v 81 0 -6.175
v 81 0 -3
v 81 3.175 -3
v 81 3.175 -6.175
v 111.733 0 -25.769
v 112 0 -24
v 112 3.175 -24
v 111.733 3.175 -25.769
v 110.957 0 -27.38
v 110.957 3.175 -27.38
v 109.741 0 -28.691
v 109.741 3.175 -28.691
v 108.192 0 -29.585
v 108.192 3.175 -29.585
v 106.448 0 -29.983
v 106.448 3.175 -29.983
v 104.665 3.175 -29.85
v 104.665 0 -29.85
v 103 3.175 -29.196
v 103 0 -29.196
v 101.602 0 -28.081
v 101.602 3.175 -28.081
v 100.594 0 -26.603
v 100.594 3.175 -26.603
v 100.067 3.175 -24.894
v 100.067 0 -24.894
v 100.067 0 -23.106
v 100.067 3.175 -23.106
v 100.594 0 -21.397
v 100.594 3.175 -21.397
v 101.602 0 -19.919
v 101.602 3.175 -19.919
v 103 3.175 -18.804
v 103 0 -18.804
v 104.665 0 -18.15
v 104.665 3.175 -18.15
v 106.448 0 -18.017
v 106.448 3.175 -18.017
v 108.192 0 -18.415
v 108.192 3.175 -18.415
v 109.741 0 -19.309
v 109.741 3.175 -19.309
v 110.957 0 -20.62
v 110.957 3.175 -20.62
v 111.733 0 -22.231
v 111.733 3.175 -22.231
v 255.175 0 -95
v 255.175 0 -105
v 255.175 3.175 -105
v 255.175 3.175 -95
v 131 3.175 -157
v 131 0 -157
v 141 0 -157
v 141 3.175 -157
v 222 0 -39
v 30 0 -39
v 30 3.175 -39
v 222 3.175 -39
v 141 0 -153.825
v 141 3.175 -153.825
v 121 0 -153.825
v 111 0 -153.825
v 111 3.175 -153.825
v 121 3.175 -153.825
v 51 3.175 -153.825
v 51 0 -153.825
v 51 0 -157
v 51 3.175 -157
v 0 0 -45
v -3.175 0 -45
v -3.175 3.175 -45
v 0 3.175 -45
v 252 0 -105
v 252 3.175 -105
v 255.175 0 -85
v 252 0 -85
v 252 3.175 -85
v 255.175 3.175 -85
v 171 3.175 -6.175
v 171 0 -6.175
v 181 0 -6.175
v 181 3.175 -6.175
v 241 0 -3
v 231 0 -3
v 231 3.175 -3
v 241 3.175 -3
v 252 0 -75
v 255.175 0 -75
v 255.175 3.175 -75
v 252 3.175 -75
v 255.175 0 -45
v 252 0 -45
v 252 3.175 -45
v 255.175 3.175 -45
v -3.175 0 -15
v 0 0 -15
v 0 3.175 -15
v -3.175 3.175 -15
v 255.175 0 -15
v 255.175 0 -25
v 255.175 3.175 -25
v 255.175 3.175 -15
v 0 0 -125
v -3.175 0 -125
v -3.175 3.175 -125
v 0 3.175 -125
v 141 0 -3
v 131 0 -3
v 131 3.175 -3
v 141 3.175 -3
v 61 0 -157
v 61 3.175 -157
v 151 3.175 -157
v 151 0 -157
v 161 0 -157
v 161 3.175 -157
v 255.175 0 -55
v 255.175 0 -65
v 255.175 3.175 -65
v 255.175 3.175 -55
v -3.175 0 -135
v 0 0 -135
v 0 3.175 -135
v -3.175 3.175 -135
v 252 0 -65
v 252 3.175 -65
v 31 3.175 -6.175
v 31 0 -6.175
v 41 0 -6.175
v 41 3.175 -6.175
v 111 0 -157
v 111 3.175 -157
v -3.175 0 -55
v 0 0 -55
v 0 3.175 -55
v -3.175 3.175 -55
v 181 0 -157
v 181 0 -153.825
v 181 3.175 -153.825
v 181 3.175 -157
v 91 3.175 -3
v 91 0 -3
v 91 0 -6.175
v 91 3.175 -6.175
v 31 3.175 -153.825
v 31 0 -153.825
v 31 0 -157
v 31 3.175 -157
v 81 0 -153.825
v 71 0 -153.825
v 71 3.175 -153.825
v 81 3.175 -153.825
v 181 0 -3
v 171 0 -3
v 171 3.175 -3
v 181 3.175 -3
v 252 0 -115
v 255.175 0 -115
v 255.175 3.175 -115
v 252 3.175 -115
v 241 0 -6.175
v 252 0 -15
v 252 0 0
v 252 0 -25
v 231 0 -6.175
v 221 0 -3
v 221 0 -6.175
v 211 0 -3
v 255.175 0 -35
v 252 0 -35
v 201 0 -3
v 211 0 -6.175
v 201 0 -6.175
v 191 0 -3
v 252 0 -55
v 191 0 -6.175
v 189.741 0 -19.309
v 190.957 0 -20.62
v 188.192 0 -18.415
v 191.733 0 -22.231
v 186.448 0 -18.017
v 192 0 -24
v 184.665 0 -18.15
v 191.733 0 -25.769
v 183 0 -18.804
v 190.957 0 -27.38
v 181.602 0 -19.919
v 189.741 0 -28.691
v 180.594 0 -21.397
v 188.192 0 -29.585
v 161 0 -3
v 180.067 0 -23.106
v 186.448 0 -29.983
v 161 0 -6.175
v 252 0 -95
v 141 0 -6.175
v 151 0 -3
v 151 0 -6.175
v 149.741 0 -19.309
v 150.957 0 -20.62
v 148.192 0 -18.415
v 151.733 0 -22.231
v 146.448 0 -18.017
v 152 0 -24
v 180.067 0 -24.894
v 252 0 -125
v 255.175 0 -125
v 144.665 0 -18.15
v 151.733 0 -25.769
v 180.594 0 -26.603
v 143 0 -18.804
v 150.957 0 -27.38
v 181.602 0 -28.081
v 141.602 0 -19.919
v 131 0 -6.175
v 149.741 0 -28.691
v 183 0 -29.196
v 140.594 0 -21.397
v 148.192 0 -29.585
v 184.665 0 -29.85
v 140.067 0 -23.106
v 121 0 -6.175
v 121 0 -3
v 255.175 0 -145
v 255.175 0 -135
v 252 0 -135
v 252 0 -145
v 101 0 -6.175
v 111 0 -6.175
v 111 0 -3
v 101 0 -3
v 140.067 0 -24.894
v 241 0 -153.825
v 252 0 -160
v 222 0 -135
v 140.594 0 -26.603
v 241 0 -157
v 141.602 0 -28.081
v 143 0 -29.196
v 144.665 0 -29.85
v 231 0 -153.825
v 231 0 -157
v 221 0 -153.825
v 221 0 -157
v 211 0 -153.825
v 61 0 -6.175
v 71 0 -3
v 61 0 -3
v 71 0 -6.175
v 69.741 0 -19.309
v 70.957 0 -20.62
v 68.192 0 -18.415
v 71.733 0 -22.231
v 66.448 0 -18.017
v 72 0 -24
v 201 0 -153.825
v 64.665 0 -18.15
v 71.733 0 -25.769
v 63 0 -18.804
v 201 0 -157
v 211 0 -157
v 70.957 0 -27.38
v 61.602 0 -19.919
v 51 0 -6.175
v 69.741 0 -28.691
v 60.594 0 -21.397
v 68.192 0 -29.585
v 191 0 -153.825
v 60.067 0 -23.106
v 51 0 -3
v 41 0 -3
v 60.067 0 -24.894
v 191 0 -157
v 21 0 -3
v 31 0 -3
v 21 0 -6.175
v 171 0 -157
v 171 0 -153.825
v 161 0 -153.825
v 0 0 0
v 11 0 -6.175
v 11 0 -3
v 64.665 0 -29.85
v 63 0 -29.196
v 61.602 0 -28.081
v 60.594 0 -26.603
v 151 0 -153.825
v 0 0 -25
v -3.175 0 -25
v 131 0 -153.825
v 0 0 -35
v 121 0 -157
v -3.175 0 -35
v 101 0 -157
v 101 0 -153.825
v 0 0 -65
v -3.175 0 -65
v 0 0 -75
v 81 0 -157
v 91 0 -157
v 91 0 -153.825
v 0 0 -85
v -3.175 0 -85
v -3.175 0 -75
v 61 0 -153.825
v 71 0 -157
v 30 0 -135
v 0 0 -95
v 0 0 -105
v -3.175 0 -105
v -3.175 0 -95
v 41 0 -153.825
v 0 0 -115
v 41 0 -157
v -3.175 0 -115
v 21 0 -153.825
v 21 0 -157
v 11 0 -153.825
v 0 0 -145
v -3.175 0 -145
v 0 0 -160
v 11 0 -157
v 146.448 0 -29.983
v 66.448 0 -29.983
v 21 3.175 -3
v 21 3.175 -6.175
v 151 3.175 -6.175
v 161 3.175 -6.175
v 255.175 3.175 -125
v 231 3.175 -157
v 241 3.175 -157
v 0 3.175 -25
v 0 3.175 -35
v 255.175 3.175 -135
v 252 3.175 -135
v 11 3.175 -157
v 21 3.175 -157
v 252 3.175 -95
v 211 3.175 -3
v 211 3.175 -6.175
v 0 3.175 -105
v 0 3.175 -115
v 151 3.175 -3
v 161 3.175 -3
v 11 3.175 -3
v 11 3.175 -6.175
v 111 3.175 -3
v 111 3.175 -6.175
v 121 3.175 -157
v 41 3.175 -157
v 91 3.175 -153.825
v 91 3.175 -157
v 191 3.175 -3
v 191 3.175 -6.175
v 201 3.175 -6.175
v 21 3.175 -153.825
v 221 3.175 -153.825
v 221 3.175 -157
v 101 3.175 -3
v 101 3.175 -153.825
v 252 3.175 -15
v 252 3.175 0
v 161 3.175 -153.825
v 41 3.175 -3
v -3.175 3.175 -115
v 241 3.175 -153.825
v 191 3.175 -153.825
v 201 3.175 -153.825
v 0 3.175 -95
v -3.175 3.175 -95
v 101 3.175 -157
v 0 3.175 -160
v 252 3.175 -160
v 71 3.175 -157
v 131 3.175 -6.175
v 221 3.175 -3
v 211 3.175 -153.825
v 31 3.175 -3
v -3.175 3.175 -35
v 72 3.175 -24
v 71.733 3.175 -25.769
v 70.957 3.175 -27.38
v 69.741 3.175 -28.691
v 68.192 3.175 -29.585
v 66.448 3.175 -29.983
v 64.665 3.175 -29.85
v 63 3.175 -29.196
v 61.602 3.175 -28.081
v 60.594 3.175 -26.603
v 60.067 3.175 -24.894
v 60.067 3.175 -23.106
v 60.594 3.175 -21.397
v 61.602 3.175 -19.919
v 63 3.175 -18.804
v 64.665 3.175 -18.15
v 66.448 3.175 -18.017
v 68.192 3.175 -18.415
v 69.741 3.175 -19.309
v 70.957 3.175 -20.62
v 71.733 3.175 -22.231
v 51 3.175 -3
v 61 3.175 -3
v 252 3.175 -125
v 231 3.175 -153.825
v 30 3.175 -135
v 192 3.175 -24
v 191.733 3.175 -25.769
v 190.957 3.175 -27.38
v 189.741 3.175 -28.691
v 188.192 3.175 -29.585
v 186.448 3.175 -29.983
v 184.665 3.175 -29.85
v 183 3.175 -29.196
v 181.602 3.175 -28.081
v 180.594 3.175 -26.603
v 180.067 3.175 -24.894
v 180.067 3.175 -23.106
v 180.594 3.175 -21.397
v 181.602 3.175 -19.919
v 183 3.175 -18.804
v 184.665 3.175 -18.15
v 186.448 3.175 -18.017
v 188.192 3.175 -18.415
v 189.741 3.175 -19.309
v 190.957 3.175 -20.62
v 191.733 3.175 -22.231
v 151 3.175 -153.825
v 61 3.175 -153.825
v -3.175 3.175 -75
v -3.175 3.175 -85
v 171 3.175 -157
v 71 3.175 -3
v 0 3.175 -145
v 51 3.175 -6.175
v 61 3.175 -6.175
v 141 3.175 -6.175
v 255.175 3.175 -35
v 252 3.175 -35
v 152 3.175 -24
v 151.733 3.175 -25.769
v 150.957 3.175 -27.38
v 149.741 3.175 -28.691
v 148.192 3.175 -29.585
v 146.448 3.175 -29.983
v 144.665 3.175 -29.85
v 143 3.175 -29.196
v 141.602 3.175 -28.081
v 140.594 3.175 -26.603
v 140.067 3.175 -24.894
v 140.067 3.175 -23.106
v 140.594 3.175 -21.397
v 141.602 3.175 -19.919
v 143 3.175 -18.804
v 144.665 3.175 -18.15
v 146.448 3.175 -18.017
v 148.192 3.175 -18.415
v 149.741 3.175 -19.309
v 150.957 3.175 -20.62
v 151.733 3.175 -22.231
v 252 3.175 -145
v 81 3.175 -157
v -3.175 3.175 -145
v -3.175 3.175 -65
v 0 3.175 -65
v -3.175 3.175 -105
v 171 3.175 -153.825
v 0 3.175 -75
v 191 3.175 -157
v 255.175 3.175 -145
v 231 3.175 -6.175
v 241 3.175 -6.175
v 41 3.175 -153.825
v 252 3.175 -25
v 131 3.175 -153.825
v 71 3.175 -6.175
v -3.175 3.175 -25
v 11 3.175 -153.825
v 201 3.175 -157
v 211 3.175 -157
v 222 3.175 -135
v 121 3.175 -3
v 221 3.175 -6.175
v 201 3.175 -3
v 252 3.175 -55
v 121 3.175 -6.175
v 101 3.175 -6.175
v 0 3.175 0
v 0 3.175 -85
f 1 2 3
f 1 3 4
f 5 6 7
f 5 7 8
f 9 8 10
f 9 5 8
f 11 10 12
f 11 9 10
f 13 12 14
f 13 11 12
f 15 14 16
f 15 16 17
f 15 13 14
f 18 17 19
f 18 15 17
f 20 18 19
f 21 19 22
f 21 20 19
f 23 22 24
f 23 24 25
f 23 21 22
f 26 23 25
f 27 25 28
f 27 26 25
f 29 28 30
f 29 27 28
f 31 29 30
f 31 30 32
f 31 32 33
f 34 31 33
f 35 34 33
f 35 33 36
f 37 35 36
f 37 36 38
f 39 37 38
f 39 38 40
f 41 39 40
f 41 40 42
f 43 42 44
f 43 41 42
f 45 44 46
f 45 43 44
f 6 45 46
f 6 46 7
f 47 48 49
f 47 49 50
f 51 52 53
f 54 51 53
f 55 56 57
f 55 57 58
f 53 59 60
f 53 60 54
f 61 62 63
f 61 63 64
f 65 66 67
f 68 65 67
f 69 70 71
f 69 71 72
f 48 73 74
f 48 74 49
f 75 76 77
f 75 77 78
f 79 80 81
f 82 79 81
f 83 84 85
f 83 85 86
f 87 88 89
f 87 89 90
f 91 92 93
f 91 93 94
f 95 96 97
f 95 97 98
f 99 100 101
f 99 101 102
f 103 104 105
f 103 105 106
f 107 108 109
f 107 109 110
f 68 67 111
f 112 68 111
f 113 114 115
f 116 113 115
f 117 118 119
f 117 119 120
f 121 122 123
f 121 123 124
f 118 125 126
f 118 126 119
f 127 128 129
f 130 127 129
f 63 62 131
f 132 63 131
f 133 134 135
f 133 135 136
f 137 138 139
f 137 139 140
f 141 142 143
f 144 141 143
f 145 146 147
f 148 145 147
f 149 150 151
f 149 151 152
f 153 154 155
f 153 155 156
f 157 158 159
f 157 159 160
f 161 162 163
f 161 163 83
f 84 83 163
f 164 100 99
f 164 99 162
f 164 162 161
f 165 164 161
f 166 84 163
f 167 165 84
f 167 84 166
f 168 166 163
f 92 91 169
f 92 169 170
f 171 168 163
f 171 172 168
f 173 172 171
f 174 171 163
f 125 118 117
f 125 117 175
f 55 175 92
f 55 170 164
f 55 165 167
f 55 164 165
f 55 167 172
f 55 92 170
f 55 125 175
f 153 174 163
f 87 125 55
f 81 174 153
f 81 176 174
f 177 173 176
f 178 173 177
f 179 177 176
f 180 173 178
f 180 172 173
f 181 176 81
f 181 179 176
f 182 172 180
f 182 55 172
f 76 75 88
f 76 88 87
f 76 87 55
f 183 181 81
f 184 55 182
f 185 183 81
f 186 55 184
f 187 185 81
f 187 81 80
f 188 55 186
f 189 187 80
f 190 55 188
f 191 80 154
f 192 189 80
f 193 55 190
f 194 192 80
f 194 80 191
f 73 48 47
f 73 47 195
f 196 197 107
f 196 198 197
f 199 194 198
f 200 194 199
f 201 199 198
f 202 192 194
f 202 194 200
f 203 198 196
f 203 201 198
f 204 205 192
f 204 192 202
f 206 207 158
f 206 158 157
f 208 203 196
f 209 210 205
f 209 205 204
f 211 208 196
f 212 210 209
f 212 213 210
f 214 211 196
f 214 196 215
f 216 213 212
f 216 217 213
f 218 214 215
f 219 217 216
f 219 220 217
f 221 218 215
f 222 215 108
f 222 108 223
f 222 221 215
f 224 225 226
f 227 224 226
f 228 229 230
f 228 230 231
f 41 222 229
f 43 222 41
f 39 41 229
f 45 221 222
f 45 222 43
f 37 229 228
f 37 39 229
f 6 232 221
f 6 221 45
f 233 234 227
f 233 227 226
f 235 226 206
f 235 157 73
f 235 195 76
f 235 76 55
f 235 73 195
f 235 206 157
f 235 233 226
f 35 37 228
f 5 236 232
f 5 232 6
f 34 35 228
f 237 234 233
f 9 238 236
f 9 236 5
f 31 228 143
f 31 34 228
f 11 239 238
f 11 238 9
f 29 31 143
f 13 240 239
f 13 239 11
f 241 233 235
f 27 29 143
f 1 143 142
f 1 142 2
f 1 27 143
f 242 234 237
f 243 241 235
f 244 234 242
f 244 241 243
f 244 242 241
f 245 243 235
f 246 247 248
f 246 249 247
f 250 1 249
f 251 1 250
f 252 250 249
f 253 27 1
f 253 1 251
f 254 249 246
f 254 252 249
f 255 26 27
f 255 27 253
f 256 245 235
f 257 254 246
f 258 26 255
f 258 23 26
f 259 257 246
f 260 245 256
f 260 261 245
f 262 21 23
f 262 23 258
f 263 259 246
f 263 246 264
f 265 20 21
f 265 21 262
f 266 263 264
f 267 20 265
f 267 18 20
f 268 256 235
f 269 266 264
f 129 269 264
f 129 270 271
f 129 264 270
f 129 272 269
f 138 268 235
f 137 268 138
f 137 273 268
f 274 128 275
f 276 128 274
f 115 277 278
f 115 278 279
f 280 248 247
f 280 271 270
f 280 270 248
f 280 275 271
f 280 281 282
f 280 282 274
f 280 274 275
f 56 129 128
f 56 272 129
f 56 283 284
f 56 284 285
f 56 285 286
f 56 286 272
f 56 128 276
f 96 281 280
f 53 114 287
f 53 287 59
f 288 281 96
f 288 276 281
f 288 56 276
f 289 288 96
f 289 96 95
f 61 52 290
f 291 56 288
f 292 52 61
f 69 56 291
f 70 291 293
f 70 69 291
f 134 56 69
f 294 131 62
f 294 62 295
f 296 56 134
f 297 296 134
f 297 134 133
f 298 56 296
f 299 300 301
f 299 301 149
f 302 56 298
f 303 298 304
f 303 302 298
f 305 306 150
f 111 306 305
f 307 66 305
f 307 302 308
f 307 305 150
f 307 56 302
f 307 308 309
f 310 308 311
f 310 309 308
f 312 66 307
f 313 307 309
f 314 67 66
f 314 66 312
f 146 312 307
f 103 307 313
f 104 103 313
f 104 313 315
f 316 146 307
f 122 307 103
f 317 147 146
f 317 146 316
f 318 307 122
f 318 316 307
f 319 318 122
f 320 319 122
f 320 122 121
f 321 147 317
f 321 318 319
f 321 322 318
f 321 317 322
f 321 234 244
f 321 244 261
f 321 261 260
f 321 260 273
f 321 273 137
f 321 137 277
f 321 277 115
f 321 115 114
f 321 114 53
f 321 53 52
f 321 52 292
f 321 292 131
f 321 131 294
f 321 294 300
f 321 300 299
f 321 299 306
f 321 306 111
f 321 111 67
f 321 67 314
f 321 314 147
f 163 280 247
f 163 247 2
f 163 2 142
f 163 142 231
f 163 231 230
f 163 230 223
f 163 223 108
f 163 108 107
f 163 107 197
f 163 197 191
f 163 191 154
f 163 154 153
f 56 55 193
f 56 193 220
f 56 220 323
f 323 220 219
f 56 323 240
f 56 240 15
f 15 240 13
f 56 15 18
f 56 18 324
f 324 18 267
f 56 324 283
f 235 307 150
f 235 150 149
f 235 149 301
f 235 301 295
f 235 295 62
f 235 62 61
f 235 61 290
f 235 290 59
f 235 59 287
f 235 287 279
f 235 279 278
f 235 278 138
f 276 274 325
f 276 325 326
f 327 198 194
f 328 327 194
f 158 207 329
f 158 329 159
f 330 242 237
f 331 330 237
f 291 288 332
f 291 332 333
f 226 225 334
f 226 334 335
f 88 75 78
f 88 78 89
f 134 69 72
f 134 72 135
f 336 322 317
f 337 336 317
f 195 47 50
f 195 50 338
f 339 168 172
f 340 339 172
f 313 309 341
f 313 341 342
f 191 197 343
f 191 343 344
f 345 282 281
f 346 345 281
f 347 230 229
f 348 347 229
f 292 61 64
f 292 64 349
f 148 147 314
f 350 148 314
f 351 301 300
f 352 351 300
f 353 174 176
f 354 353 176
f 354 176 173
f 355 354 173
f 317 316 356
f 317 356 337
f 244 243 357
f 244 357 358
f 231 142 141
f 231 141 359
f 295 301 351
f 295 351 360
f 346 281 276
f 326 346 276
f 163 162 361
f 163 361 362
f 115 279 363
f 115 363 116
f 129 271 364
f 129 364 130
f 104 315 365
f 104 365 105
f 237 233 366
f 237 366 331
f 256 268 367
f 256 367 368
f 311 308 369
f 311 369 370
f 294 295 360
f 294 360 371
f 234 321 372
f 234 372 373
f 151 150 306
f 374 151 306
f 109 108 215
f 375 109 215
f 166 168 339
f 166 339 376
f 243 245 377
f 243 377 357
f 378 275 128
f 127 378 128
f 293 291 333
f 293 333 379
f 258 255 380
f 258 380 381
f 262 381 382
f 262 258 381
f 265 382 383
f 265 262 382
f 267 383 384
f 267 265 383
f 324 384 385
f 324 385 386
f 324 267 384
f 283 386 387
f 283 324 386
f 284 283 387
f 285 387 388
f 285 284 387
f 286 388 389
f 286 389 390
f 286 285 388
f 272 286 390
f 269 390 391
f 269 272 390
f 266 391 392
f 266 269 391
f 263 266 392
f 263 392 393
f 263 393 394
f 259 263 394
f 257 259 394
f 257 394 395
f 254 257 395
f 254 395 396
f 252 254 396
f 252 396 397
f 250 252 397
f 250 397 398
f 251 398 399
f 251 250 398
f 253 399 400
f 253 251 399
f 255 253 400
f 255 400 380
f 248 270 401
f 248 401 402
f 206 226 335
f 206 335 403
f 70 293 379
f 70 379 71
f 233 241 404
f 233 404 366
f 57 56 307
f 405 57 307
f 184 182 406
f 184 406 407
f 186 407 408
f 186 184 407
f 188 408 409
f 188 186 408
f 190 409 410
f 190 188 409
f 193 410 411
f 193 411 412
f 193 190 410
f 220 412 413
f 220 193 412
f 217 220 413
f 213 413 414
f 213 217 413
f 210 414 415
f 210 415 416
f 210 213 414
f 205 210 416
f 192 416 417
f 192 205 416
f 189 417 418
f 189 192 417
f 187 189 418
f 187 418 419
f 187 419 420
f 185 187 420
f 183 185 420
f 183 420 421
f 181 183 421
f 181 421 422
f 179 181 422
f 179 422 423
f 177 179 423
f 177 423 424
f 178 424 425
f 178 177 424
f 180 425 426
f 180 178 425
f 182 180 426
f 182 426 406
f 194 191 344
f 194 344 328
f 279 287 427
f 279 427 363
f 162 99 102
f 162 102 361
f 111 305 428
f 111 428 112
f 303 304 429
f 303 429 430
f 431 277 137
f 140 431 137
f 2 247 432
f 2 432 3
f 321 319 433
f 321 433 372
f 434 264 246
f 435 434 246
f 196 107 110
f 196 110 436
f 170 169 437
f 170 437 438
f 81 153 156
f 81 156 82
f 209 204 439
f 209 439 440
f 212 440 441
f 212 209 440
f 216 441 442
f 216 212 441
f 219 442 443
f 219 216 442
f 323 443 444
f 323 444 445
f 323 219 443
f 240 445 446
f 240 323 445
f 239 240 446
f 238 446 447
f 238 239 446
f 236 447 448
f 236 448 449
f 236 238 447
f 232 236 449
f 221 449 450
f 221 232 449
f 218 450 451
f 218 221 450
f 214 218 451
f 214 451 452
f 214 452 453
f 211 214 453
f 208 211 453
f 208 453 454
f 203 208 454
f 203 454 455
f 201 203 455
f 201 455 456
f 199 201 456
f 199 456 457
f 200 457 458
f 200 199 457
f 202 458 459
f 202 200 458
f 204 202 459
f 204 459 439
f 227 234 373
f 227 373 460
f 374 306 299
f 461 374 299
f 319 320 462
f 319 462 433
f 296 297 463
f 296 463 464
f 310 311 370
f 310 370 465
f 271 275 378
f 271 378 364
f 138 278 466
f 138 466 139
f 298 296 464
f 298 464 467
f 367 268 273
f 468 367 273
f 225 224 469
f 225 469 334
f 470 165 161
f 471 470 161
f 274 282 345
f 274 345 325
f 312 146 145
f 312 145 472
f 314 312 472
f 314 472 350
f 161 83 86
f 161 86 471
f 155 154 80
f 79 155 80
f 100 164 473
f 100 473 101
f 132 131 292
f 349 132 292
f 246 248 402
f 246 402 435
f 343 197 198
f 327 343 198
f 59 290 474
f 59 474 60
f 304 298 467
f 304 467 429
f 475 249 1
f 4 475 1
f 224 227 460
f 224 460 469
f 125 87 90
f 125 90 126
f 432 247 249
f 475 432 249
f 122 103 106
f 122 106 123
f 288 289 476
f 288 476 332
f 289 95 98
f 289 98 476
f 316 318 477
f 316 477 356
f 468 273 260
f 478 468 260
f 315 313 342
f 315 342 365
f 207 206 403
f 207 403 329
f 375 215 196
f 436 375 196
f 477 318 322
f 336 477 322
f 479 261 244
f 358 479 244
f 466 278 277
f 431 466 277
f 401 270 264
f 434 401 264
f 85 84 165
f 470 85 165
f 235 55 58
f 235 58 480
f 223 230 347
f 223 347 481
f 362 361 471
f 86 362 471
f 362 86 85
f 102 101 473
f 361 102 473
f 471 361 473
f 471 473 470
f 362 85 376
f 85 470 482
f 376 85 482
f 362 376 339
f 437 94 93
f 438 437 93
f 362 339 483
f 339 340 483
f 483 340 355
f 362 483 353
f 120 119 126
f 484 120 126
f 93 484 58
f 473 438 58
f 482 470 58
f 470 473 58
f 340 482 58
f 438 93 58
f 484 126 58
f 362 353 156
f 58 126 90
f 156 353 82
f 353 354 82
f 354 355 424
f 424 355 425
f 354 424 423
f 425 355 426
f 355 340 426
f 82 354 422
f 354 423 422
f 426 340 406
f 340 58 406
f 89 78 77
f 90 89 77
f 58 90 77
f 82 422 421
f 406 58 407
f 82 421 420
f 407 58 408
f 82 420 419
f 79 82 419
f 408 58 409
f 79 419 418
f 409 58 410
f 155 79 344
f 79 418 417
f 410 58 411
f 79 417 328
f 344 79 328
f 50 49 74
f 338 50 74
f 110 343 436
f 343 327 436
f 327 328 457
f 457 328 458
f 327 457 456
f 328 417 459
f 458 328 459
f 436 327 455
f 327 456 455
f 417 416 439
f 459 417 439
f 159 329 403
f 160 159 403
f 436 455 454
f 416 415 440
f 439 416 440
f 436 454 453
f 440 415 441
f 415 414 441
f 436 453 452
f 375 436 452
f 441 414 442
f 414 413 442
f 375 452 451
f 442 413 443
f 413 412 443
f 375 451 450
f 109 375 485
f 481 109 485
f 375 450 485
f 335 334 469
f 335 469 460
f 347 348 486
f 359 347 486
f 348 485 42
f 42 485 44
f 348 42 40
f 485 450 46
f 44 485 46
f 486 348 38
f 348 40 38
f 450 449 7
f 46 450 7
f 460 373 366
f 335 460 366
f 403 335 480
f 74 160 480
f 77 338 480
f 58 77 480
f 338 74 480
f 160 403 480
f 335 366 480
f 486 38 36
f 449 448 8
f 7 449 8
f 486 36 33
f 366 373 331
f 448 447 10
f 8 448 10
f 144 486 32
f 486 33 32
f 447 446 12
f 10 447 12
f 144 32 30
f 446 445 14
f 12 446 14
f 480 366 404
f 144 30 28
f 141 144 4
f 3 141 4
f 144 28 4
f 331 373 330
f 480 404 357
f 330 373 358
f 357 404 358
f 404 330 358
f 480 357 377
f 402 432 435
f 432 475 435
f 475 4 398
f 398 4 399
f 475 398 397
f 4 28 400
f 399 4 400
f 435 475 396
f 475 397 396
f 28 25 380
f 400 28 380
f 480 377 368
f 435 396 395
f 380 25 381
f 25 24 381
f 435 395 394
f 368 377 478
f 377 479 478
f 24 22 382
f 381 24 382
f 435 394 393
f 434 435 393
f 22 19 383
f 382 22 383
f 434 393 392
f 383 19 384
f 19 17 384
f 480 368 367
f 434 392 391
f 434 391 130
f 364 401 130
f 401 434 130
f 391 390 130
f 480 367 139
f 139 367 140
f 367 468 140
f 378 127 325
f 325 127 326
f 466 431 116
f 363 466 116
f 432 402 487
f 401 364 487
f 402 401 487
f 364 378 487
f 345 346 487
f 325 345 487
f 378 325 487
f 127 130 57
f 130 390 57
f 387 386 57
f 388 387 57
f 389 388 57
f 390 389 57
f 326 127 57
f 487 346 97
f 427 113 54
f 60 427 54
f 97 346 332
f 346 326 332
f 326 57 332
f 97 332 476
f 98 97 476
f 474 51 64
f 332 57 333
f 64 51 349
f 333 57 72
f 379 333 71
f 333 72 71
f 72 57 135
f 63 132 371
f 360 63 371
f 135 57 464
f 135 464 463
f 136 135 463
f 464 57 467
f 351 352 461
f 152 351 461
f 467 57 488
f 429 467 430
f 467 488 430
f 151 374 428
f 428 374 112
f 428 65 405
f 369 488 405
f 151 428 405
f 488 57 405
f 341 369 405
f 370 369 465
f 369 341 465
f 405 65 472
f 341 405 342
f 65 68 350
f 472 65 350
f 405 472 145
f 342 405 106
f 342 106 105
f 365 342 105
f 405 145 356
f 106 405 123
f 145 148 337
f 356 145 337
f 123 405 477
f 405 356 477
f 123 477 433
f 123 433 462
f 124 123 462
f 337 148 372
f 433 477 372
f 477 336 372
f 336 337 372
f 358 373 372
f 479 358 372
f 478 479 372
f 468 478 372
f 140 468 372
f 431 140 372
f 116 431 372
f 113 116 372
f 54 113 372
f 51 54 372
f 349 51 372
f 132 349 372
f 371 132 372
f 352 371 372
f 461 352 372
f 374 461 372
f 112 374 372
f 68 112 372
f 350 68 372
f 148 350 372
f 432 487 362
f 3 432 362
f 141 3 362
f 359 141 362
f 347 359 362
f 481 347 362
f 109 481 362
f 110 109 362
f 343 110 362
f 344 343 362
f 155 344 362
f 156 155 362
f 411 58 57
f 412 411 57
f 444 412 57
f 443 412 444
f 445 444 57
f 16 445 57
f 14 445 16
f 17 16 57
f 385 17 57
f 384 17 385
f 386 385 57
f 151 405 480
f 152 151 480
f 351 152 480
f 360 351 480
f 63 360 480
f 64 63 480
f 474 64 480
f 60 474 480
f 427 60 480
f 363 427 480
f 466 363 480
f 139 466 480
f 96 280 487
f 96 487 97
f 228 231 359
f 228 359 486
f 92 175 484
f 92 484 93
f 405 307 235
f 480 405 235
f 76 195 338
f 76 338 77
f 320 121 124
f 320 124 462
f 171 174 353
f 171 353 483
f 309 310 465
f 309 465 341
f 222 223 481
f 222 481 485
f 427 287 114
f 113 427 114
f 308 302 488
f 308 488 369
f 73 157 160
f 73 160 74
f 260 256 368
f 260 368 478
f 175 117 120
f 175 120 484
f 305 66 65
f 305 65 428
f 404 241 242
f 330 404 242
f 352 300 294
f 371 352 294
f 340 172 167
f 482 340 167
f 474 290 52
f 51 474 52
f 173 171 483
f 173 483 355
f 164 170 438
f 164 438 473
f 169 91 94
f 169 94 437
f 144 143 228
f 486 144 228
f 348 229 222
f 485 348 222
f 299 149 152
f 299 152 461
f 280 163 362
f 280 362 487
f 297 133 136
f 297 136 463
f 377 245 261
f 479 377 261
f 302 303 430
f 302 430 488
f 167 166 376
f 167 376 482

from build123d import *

# Parameters (mm, degrees)
SKETCH1_R           = 6
SKETCH1_W           = 10
SKETCH1_H           = 3.175
SKETCH1_W_2         = 192
SKETCH1_H_2         = 96
BOSS_EXTRUDE1_DEPTH = 3.175


with BuildPart() as part:
    # Sketch1 → Boss-Extrude1 (new body)
    with BuildSketch(Plane(origin=(0, 0, 0), x_dir=(1, 0, 0), z_dir=(0, 1, 0))):
        Polygon((0, 145), (0, 160), (252, 160), (252, 145), (255.175, 145), (255.175, 135), (252, 135), (252, 125), (255.175, 125), (255.175, 115), (252, 115), (252, 105), (255.175, 105), (255.175, 95), (252, 95), (252, 85), (255.175, 85), (255.175, 75), (252, 75), (252, 65), (255.175, 65), (255.175, 55), (252, 55), (252, 45), (255.175, 45), (255.175, 35), (252, 35), (252, 25), (255.175, 25), (255.175, 15), (252, 15), (252, 0), (0, 0), (0, 15), (-3.175, 15), (-3.175, 25), (0, 25), (0, 35), (-3.175, 35), (-3.175, 45), (0, 45), (0, 55), (-3.175, 55), (-3.175, 65), (0, 65), (0, 75), (-3.175, 75), (-3.175, 85), (0, 85), (0, 95), (-3.175, 95), (-3.175, 105), (0, 105), (0, 115), (-3.175, 115), (-3.175, 125), (0, 125), (0, 135), (-3.175, 135), (-3.175, 145), align=None)
        with Locations((106, 24)):
            Circle(SKETCH1_R, mode=Mode.SUBTRACT)
        with Locations((66, 24)):
            Circle(SKETCH1_R, mode=Mode.SUBTRACT)
        with Locations((186, 24)):
            Circle(SKETCH1_R, mode=Mode.SUBTRACT)
        with Locations((146, 24)):
            Circle(SKETCH1_R, mode=Mode.SUBTRACT)
        with Locations((36, 155.4125)):
            Rectangle(SKETCH1_W, SKETCH1_H, mode=Mode.SUBTRACT)
        with Locations((126, 87)):
            Rectangle(SKETCH1_W_2, SKETCH1_H_2, mode=Mode.SUBTRACT)
        with Locations((16, 155.4125)):
            Rectangle(SKETCH1_W, SKETCH1_H, mode=Mode.SUBTRACT)
        with Locations((56, 155.4125)):
            Rectangle(SKETCH1_W, SKETCH1_H, mode=Mode.SUBTRACT)
        with Locations((76, 155.4125)):
            Rectangle(SKETCH1_W, SKETCH1_H, mode=Mode.SUBTRACT)
        with Locations((96, 155.4125)):
            Rectangle(SKETCH1_W, SKETCH1_H, mode=Mode.SUBTRACT)
        with Locations((116, 155.4125)):
            Rectangle(SKETCH1_W, SKETCH1_H, mode=Mode.SUBTRACT)
        with Locations((136, 155.4125)):
            Rectangle(SKETCH1_W, SKETCH1_H, mode=Mode.SUBTRACT)
        with Locations((156, 155.4125)):
            Rectangle(SKETCH1_W, SKETCH1_H, mode=Mode.SUBTRACT)
        with Locations((176, 155.4125)):
            Rectangle(SKETCH1_W, SKETCH1_H, mode=Mode.SUBTRACT)
        with Locations((196, 155.4125)):
            Rectangle(SKETCH1_W, SKETCH1_H, mode=Mode.SUBTRACT)
        with Locations((216, 155.4125)):
            Rectangle(SKETCH1_W, SKETCH1_H, mode=Mode.SUBTRACT)
        with Locations((236, 155.4125)):
            Rectangle(SKETCH1_W, SKETCH1_H, mode=Mode.SUBTRACT)
        with Locations((236, 4.5875)):
            Rectangle(SKETCH1_W, SKETCH1_H, mode=Mode.SUBTRACT)
        with Locations((216, 4.5875)):
            Rectangle(SKETCH1_W, SKETCH1_H, mode=Mode.SUBTRACT)
        with Locations((196, 4.5875)):
            Rectangle(SKETCH1_W, SKETCH1_H, mode=Mode.SUBTRACT)
        with Locations((176, 4.5875)):
            Rectangle(SKETCH1_W, SKETCH1_H, mode=Mode.SUBTRACT)
        with Locations((156, 4.5875)):
            Rectangle(SKETCH1_W, SKETCH1_H, mode=Mode.SUBTRACT)
        with Locations((136, 4.5875)):
            Rectangle(SKETCH1_W, SKETCH1_H, mode=Mode.SUBTRACT)
        with Locations((116, 4.5875)):
            Rectangle(SKETCH1_W, SKETCH1_H, mode=Mode.SUBTRACT)
        with Locations((96, 4.5875)):
            Rectangle(SKETCH1_W, SKETCH1_H, mode=Mode.SUBTRACT)
        with Locations((76, 4.5875)):
            Rectangle(SKETCH1_W, SKETCH1_H, mode=Mode.SUBTRACT)
        with Locations((56, 4.5875)):
            Rectangle(SKETCH1_W, SKETCH1_H, mode=Mode.SUBTRACT)
        with Locations((36, 4.5875)):
            Rectangle(SKETCH1_W, SKETCH1_H, mode=Mode.SUBTRACT)
        with Locations((16, 4.5875)):
            Rectangle(SKETCH1_W, SKETCH1_H, mode=Mode.SUBTRACT)
    extrude(amount=BOSS_EXTRUDE1_DEPTH)


solid = part.part
